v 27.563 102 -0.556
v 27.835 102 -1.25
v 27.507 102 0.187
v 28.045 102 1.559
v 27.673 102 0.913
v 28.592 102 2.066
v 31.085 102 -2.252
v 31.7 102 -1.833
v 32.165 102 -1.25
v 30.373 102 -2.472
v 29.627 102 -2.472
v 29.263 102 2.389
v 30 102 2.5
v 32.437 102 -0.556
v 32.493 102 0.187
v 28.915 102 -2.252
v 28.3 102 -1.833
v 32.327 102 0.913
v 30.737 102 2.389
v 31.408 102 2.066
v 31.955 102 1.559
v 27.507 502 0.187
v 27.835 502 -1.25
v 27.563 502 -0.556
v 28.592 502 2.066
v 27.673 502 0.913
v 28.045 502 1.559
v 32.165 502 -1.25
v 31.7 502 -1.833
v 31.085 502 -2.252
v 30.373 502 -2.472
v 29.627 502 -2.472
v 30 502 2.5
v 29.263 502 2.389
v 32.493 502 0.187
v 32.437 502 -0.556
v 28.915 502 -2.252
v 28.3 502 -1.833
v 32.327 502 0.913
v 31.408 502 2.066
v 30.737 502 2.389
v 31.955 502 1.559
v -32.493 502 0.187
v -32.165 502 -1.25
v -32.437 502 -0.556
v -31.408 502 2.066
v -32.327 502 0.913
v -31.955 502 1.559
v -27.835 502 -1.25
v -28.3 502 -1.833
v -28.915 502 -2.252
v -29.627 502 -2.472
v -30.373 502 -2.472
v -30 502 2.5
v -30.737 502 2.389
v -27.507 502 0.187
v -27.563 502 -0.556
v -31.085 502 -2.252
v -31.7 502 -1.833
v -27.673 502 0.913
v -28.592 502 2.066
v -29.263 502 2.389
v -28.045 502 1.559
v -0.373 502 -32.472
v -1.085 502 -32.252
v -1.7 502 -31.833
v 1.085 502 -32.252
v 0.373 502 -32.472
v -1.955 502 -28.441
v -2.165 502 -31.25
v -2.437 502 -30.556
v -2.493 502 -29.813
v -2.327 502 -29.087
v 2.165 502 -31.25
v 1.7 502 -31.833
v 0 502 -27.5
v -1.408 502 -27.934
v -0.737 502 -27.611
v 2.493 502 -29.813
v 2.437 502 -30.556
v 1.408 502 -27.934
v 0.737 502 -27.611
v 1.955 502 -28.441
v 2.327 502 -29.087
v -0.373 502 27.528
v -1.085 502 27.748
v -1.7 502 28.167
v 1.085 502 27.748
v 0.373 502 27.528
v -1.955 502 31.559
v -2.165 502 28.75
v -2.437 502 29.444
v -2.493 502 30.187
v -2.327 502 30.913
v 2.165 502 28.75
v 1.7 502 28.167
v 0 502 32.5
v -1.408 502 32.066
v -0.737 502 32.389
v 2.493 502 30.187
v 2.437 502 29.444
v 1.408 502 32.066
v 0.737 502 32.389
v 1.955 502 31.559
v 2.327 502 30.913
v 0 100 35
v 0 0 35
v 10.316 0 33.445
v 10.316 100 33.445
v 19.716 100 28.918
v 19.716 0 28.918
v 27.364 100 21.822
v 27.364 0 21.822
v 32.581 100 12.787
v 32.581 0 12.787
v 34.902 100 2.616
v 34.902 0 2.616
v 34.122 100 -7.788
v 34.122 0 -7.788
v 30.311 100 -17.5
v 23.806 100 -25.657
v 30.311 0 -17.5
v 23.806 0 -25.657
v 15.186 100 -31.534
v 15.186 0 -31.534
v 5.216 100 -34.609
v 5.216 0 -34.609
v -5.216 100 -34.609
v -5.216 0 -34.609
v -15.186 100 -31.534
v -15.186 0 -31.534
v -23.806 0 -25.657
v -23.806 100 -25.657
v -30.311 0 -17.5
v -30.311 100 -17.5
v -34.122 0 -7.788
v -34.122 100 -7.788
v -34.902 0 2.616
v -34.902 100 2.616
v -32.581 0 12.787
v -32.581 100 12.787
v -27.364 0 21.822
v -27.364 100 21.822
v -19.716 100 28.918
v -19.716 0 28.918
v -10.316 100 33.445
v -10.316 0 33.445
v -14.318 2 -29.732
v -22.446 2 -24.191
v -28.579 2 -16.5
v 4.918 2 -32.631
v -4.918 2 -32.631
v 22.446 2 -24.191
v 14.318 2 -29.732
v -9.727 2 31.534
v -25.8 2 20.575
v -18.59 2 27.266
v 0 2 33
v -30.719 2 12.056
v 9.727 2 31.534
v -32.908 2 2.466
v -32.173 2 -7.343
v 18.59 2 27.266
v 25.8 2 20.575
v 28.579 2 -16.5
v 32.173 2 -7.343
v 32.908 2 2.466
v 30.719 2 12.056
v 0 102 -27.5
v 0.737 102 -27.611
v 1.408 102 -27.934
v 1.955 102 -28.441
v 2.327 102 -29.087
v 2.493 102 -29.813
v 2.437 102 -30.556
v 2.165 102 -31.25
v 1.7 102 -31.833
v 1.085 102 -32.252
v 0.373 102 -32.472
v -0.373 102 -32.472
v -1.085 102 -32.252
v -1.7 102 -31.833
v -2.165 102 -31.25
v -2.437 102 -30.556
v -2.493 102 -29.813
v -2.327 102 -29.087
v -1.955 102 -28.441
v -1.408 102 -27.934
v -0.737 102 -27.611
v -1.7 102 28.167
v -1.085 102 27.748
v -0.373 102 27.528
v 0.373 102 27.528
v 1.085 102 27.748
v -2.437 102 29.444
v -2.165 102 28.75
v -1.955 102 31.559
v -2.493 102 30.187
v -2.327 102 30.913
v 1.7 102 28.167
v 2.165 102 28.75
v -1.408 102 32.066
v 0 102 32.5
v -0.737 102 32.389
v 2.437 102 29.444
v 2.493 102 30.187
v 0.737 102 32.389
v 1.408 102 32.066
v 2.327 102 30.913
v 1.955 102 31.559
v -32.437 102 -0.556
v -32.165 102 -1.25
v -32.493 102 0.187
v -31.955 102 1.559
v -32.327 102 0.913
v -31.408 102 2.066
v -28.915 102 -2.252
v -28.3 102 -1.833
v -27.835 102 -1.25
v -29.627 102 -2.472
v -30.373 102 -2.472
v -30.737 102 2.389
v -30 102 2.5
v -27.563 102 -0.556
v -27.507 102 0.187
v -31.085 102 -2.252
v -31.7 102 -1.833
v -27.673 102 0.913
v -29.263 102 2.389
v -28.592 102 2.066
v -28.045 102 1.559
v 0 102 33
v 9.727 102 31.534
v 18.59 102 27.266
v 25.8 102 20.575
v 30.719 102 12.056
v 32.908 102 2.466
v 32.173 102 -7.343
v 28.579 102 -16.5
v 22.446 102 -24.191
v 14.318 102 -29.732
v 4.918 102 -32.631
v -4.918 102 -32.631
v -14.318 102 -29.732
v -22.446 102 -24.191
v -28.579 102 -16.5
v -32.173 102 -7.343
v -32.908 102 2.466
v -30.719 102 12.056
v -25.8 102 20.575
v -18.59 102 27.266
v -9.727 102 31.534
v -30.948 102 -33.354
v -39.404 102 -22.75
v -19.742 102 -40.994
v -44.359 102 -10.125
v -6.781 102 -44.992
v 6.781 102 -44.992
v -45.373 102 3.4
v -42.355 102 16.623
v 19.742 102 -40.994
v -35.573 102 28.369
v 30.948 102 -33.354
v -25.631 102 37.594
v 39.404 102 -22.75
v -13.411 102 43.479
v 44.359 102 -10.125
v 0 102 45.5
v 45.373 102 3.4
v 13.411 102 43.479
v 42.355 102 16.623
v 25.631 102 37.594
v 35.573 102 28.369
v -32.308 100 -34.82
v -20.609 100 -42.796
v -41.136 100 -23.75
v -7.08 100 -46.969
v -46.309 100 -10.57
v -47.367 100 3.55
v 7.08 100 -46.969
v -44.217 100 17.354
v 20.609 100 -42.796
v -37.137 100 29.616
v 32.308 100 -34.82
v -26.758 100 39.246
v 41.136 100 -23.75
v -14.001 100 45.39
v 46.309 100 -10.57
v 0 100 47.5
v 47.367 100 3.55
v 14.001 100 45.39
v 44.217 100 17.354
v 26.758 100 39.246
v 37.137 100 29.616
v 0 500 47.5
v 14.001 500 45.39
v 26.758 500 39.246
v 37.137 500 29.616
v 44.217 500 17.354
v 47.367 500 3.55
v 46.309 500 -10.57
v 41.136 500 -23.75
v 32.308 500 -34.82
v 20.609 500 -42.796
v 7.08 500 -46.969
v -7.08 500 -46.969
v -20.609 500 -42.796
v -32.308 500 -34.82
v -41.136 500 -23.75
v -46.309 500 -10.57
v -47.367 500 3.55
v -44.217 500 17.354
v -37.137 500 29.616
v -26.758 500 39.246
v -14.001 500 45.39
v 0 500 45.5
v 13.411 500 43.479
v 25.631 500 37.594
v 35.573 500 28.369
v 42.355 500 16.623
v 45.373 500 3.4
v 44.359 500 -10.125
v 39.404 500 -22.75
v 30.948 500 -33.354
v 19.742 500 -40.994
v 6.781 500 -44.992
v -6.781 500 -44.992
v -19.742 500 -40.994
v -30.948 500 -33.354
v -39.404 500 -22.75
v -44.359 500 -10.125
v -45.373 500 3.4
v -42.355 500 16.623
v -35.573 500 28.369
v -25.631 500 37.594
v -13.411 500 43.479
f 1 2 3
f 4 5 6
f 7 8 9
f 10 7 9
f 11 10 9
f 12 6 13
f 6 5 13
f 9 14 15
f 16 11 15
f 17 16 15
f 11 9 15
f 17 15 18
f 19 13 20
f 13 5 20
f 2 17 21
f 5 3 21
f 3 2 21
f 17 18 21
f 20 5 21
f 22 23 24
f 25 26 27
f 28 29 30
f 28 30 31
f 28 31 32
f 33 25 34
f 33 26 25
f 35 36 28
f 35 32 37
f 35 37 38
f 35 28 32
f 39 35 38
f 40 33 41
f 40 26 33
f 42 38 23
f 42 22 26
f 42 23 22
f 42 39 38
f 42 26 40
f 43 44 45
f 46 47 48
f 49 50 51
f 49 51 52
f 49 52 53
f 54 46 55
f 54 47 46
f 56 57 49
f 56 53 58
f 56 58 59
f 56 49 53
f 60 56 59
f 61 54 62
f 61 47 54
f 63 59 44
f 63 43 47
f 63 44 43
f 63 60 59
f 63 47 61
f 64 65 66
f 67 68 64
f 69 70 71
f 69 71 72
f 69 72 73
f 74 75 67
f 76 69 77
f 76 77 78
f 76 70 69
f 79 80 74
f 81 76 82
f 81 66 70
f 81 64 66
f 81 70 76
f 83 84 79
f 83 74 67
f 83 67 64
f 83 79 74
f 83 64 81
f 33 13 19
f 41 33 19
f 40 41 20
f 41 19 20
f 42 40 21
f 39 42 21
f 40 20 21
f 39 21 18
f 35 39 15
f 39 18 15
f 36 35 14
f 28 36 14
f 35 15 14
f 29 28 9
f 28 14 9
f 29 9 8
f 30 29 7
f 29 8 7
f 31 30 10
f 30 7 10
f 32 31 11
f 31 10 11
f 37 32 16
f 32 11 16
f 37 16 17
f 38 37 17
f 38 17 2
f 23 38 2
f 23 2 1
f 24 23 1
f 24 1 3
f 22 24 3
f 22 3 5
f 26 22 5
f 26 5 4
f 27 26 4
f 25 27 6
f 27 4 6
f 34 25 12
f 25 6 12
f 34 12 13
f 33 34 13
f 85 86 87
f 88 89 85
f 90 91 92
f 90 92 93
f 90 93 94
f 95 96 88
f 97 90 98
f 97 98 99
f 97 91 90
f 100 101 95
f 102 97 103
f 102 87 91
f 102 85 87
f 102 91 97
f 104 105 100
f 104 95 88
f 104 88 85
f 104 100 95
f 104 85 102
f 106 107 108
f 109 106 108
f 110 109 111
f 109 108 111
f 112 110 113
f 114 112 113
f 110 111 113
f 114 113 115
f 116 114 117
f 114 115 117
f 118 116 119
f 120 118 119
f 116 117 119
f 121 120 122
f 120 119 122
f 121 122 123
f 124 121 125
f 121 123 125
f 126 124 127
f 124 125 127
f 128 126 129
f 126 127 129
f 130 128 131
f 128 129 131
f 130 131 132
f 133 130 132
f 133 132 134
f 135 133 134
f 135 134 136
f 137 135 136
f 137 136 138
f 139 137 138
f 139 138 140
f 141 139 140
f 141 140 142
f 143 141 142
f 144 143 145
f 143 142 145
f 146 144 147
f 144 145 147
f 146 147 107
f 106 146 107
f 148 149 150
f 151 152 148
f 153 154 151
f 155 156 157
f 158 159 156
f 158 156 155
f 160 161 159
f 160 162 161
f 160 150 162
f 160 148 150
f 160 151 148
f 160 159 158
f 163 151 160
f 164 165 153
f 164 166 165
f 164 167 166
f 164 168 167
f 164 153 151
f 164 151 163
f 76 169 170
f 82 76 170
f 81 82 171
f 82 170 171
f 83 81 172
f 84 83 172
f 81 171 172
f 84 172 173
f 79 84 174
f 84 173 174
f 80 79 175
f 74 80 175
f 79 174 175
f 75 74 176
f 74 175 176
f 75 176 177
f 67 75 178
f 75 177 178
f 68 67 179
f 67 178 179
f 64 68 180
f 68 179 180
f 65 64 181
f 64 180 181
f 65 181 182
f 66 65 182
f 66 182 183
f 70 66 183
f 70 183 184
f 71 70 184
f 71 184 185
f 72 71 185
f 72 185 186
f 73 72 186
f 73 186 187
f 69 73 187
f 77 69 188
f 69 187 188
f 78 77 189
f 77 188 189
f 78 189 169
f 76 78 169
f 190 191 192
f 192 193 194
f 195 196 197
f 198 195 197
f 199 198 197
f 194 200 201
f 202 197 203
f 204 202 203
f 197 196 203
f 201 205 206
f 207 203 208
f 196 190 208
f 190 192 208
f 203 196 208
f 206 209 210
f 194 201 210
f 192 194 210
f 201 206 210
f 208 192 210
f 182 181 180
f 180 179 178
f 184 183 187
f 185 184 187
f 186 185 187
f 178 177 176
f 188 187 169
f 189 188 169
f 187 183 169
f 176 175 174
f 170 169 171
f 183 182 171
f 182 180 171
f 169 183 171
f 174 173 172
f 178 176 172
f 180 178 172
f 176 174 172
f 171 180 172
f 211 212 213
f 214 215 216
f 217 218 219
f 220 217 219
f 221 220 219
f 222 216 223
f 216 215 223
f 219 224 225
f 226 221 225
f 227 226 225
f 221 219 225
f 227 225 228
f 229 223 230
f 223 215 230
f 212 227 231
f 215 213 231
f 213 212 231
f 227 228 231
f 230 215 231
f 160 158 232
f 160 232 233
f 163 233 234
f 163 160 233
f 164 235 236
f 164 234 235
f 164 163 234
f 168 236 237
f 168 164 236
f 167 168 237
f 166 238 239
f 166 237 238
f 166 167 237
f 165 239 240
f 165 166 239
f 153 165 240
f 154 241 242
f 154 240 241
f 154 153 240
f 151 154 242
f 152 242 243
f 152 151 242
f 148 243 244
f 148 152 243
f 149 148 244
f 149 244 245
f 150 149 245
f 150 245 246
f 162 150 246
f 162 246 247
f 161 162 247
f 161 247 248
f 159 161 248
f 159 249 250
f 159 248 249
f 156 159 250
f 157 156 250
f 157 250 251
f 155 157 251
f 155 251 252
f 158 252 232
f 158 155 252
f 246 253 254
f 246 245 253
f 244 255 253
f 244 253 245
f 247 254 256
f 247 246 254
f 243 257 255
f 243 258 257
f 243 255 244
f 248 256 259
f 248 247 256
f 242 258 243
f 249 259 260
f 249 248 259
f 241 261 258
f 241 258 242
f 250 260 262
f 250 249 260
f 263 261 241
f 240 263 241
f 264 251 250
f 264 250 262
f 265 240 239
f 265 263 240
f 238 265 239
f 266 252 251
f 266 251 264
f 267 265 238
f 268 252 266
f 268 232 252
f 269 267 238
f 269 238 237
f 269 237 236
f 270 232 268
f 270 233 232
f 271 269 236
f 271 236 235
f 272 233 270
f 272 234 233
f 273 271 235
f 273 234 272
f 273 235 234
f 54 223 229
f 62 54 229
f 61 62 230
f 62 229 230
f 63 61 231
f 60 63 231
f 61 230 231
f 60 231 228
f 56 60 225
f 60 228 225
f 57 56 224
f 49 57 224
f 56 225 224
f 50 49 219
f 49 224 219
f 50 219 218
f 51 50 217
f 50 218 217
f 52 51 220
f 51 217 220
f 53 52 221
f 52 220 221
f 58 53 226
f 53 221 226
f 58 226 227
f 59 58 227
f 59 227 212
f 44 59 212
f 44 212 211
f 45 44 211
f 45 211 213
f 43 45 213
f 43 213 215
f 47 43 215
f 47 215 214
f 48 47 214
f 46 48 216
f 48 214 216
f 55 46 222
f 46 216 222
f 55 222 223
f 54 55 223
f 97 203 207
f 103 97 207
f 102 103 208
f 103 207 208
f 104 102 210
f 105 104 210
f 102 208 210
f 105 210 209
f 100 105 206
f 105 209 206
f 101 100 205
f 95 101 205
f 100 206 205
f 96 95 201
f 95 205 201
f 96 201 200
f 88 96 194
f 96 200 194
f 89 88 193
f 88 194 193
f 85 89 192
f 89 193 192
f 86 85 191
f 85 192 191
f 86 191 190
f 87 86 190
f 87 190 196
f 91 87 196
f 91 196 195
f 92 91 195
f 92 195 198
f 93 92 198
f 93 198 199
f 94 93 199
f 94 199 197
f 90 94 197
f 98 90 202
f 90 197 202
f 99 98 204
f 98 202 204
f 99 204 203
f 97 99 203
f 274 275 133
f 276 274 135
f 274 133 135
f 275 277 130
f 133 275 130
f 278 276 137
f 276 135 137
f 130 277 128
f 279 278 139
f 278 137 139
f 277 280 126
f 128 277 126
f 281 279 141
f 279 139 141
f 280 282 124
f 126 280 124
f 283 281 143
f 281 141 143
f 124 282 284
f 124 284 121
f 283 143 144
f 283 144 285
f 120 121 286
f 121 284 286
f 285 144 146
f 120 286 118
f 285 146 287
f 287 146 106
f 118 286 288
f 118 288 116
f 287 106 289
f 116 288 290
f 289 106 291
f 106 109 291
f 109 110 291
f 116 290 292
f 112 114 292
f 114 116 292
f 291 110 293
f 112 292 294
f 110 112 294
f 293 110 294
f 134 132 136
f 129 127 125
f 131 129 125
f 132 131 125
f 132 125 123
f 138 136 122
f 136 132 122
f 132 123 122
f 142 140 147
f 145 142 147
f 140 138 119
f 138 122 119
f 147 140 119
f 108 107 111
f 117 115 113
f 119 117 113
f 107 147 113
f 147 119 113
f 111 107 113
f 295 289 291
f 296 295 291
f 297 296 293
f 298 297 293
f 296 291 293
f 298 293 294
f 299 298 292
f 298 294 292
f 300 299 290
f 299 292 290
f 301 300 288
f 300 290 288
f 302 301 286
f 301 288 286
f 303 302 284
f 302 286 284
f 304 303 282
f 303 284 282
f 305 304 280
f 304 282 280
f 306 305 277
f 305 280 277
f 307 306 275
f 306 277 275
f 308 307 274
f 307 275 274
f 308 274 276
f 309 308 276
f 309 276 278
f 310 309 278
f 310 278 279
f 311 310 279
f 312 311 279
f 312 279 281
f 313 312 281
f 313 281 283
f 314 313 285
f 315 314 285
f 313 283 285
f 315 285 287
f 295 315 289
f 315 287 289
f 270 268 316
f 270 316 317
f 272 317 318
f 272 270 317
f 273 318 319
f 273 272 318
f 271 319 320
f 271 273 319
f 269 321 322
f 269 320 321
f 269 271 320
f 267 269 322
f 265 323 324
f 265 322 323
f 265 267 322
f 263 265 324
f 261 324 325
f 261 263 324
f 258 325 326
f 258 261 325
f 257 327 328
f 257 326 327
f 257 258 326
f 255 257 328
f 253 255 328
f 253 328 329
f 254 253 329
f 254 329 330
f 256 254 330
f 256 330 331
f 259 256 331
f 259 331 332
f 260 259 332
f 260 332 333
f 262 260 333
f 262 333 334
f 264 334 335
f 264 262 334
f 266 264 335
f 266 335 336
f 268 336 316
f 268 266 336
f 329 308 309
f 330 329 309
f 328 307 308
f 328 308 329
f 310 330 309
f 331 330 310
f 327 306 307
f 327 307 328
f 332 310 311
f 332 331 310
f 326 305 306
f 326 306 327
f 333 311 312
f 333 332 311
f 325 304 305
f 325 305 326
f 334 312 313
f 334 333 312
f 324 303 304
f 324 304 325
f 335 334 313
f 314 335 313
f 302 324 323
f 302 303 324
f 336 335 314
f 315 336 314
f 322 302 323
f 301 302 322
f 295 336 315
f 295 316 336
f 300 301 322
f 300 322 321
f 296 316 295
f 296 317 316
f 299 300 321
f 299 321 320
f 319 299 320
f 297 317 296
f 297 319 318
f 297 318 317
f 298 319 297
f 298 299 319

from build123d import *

# Parameters (mm, degrees)
SKETCH1_R             = 35
BOSS_EXTRUDE1_DEPTH   = 100
SKETCH2_R             = 47.5
BOSS_EXTRUDE2_DEPTH   = 400
SHELL1_T              = -2
SKETCH3_R             = 2.5
BOSS_EXTRUDE3_DEPTH   = 400
BOSS_EXTRUDE3_2_DEPTH = 400
BOSS_EXTRUDE3_3_DEPTH = 400
BOSS_EXTRUDE3_4_DEPTH = 400


with BuildPart() as part:
    # Sketch1 → Boss-Extrude1 (new body)
    with BuildSketch(Plane(origin=(0, 0, 0), x_dir=(1, 0, 0), z_dir=(0, 1, 0))):
        with Locations(Location((0, 0, 0), (0, 0, 270))):
            Circle(SKETCH1_R)
    extrude(amount=BOSS_EXTRUDE1_DEPTH)

    # Sketch2 → Boss-Extrude2 (add)
    with BuildSketch(Plane(origin=(0, 100, 0), x_dir=(1, 0, 0), z_dir=(0, 1, 0))):
        with Locations(Location((0, 0, 0), (0, 0, 270))):
            Circle(SKETCH2_R)
    extrude(amount=BOSS_EXTRUDE2_DEPTH)

    # Shell1
    shell1_openings = [part.faces().sort_by_distance(p)[0] for p in [
        (0, 500, 0),
    ]]
    offset(amount=SHELL1_T, openings=shell1_openings, kind=Kind.INTERSECTION)


with BuildPart() as body_2:
    # Sketch3 → Boss-Extrude3 (new body)
    with BuildSketch(Plane(origin=(0, 102, 0), x_dir=(1, 0, 0), z_dir=(0, 1, 0))):
        with Locations(Location((-30, 0, 0), (0, 0, 270))):
            Circle(SKETCH3_R)
    extrude(amount=BOSS_EXTRUDE3_DEPTH)


with BuildPart() as body_3:
    # Sketch3 → Boss-Extrude3 2 (new body)
    with BuildSketch(Plane(origin=(0, 102, 0), x_dir=(1, 0, 0), z_dir=(0, 1, 0))):
        with Locations(Location((0, 30, 0), (0, 0, 270))):
            Circle(SKETCH3_R)
    extrude(amount=BOSS_EXTRUDE3_2_DEPTH)


with BuildPart() as body_4:
    # Sketch3 → Boss-Extrude3 3 (new body)
    with BuildSketch(Plane(origin=(0, 102, 0), x_dir=(1, 0, 0), z_dir=(0, 1, 0))):
        with Locations(Location((30, 0, 0), (0, 0, 270))):
            Circle(SKETCH3_R)
    extrude(amount=BOSS_EXTRUDE3_3_DEPTH)


with BuildPart() as body_5:
    # Sketch3 → Boss-Extrude3 4 (new body)
    with BuildSketch(Plane(origin=(0, 102, 0), x_dir=(1, 0, 0), z_dir=(0, 1, 0))):
        with Locations(Location((0, -30, 0), (0, 0, 270))):
            Circle(SKETCH3_R)
    extrude(amount=BOSS_EXTRUDE3_4_DEPTH)


solid = Compound([part.part, body_2.part, body_3.part, body_4.part, body_5.part])
